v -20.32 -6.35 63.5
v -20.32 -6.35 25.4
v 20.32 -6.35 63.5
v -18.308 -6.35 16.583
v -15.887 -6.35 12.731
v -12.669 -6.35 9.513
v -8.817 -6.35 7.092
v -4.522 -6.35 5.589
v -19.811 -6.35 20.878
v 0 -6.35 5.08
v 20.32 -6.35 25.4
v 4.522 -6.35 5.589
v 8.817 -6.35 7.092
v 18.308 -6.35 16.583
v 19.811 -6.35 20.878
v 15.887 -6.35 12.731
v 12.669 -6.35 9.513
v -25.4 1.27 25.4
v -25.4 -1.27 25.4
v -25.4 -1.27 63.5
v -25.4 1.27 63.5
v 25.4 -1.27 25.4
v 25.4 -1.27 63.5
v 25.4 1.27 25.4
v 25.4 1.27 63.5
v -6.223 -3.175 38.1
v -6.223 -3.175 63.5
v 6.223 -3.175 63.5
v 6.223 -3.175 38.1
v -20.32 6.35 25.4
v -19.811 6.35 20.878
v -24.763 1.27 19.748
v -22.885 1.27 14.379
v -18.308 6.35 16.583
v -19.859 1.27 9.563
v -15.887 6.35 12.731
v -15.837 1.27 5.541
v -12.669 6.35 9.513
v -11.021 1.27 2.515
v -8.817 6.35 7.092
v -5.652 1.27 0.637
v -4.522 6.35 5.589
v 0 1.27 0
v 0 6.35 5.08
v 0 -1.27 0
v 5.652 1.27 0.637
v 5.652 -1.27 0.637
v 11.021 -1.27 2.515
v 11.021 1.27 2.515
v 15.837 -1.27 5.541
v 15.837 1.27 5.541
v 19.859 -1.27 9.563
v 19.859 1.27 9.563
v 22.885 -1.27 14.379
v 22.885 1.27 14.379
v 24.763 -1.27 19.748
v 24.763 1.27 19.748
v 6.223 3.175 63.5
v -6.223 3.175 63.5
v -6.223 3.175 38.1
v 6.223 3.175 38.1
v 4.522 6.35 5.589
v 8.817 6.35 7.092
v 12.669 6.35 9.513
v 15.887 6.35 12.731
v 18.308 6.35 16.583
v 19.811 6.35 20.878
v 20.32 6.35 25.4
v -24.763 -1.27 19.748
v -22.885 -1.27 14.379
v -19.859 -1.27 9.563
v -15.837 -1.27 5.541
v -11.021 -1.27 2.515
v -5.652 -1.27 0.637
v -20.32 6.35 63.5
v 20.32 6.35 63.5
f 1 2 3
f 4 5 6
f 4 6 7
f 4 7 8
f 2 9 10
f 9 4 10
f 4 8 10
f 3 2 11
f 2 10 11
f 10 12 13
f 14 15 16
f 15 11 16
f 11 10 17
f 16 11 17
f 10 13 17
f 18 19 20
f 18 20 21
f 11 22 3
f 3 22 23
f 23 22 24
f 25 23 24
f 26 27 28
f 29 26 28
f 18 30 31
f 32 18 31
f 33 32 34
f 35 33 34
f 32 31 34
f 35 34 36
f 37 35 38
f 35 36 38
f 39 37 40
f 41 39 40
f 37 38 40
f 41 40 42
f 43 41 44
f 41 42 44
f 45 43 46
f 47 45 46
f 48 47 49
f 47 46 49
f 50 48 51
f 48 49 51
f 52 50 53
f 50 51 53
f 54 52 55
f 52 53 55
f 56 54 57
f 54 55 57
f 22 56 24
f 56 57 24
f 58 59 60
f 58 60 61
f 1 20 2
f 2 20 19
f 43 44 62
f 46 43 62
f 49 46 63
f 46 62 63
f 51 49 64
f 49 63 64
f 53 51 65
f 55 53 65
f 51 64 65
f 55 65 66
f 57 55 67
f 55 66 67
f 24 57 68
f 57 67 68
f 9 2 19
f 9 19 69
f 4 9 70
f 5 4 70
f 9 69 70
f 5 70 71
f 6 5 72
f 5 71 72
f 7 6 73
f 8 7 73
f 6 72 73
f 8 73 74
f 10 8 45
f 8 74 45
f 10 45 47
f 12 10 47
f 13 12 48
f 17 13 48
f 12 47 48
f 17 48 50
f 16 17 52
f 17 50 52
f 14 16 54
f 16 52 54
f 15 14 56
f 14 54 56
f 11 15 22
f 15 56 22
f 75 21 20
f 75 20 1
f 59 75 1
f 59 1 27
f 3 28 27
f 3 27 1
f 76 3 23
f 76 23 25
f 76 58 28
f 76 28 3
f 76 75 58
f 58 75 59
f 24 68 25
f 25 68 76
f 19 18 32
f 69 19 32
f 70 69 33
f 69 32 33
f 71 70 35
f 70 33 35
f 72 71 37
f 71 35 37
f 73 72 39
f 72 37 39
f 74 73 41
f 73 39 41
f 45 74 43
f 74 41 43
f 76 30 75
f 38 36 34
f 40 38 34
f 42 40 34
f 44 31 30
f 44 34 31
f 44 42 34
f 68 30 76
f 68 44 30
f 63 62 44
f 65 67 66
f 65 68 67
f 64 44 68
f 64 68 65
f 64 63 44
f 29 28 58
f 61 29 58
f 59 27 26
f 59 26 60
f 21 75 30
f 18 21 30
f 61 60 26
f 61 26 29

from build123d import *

# Parameters (mm, degrees)
F0_W     = 50.8
F0_H     = 12.7
F1_DEPTH = 25.4
F2_DEPTH = 63.5
F3_R     = 25.39999
F4_SIZE  = 5.08
F5_W     = 12.446
F5_H     = 6.35
F6_DEPTH = 25.4


# Not quite as in the source:
# - a fillet or chamfer is up to 0.001 mm smaller than in the source, because OpenCascade refuses the exact size


with BuildPart() as f1:
    # F0 (on Top) → F1 (new body)
    with BuildSketch(Plane.XY):
        Rectangle(F0_W, F0_H)
    extrude(amount=F1_DEPTH)

    # F0 (on Top) → F2 (join)
    with BuildSketch(Plane.XY):
        Rectangle(F0_W, F0_H)
    extrude(amount=F2_DEPTH)

    # F3 (radius 25.4 in the source; OpenCascade refuses exactly that, so slightly less here)
    f3_edges = [f1.edges().sort_by_distance(p)[0] for p in [
        (25.4, 0, 0),
        (-25.4, 0, 0),
    ]]
    fillet(f3_edges, radius=F3_R)

    # F4
    f4_edges = [f1.edges().sort_by_distance(p)[0] for p in [
        (-17.960515, -6.35, 7.439485),
        (-17.960515, 6.35, 7.439485),
    ]]
    chamfer(f4_edges, length=F4_SIZE)

    # F5 (on face) → F6 (cut)
    with BuildSketch(Plane.XY.offset(63.5)):
        Rectangle(F5_W, F5_H)
    extrude(amount=-F6_DEPTH, mode=Mode.SUBTRACT)


solid = f1.part
